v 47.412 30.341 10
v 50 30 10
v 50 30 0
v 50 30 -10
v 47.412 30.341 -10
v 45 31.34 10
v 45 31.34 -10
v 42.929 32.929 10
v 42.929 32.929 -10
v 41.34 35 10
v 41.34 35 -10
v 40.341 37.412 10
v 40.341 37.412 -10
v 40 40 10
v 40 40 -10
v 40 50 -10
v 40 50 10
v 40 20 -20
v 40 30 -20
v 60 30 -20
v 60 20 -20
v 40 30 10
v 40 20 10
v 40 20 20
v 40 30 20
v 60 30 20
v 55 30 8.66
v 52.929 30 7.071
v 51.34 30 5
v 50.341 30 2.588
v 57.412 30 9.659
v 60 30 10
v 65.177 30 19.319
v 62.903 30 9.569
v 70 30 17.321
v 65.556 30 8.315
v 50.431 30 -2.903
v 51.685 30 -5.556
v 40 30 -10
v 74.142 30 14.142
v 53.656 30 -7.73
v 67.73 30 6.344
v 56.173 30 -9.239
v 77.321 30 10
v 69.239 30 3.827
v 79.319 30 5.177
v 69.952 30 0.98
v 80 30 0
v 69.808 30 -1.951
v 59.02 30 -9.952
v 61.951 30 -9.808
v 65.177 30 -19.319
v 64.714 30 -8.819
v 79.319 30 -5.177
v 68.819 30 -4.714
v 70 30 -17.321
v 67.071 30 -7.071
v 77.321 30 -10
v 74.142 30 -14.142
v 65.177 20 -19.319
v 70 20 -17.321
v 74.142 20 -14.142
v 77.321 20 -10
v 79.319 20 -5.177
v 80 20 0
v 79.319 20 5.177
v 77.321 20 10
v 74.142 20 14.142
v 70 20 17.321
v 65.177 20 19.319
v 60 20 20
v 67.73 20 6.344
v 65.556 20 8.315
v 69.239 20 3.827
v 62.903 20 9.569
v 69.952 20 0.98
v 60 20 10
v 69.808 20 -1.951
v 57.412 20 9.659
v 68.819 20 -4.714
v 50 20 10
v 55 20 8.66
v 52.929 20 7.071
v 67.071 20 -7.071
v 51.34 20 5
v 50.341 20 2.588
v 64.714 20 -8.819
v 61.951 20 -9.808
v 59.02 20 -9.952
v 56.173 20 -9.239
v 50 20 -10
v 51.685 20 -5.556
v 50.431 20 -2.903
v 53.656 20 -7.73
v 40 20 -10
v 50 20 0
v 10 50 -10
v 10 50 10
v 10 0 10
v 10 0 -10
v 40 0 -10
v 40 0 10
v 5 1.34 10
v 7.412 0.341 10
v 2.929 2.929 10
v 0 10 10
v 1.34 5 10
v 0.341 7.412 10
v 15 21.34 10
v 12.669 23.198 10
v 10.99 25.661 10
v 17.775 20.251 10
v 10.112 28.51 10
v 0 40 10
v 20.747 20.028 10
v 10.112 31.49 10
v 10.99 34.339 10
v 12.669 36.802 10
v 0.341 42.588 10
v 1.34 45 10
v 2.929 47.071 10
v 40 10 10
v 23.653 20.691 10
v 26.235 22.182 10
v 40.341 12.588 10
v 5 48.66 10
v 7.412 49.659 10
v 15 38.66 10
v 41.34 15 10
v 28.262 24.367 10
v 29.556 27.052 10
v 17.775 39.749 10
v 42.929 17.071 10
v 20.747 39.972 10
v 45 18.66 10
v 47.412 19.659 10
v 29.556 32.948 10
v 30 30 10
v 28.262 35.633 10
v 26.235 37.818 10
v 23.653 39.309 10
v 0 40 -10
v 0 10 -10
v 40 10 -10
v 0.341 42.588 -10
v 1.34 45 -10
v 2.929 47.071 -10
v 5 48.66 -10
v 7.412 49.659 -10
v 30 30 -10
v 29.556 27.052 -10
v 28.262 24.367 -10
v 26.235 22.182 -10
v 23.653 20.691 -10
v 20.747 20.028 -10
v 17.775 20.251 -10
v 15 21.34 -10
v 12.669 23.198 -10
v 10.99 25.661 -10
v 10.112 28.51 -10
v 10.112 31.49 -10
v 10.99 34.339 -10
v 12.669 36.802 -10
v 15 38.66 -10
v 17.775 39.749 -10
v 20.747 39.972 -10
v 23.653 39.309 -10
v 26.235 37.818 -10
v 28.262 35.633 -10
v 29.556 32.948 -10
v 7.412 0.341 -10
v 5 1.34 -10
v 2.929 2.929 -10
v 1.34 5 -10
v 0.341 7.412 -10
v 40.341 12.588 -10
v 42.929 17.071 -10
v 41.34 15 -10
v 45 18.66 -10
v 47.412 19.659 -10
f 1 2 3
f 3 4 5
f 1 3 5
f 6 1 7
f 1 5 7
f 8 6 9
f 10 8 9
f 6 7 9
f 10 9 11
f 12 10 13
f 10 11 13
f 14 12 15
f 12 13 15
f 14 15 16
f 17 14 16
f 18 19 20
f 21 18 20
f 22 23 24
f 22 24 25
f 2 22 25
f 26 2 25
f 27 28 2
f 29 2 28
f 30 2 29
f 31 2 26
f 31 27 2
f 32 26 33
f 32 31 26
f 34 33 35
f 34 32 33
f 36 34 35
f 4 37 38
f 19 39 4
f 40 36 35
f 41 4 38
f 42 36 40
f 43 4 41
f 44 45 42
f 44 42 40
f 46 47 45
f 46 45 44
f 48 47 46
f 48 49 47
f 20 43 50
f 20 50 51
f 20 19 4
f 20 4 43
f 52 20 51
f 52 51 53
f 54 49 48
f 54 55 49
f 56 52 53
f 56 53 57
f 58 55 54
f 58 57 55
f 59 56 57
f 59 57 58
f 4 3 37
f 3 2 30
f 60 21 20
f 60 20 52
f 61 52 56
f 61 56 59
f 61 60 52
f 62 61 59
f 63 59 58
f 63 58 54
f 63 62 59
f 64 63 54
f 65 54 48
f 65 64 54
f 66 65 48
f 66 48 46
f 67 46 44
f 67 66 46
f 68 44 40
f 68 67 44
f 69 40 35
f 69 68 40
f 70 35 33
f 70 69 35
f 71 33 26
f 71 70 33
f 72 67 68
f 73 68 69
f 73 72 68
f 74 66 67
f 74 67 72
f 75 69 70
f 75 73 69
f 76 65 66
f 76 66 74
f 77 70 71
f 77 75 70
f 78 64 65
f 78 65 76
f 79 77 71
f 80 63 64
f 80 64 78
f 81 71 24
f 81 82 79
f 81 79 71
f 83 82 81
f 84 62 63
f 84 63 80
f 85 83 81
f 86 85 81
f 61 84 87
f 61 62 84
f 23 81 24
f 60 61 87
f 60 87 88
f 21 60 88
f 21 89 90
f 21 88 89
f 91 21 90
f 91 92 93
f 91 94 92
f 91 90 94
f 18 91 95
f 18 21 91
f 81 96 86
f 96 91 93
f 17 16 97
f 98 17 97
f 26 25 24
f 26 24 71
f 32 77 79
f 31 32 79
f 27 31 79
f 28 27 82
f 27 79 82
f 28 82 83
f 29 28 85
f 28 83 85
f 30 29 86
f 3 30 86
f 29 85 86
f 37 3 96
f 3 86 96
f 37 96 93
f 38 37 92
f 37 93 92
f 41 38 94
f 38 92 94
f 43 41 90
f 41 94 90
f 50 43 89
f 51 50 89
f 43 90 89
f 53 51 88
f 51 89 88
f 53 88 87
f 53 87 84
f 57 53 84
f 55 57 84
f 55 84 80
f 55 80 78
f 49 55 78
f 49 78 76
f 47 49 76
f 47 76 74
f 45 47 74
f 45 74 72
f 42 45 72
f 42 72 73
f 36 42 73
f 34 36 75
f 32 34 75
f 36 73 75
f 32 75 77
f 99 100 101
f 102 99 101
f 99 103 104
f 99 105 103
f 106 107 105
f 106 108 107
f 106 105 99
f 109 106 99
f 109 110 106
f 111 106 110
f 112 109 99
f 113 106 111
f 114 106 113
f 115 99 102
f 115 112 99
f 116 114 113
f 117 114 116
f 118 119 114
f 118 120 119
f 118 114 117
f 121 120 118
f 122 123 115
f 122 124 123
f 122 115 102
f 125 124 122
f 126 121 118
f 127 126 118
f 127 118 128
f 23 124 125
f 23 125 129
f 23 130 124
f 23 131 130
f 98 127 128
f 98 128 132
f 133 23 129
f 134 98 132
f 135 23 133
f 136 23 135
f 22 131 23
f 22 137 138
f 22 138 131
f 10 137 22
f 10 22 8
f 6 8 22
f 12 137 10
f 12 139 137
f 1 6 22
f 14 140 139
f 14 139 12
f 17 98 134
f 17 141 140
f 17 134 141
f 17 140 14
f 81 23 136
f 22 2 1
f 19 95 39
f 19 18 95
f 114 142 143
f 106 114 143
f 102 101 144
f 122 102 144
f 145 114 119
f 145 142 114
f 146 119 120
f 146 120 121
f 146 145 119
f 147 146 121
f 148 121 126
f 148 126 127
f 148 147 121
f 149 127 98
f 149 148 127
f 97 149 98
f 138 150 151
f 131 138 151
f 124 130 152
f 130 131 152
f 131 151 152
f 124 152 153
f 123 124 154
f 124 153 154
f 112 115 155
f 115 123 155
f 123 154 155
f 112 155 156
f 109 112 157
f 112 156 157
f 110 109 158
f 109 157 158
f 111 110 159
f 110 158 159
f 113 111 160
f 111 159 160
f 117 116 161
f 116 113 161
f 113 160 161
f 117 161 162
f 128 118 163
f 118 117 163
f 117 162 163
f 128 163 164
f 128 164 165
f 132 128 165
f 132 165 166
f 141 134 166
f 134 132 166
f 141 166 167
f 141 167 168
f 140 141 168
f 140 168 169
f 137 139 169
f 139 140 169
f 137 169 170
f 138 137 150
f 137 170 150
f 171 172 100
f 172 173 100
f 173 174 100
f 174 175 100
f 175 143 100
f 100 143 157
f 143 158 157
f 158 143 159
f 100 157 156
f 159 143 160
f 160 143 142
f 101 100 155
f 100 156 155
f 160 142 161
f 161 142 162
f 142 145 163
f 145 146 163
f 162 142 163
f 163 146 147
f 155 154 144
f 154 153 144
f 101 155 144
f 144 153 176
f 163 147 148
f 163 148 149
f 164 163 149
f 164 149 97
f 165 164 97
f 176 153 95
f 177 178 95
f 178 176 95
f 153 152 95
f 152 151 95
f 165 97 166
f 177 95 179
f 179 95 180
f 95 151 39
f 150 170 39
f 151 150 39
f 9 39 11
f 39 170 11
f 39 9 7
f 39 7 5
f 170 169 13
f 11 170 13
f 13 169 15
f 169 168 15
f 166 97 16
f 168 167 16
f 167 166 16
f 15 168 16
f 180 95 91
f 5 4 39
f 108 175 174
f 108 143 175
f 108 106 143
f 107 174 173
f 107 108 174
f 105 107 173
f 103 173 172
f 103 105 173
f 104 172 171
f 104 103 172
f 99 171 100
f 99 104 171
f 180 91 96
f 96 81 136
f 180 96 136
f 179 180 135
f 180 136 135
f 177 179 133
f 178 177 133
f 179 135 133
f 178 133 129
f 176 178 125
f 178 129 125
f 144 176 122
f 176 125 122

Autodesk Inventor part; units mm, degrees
ref_plane "YZ Plane" through (0, 0, 0) normal (1, 0, 0) x (0, 1, 0)
ref_plane "XZ Plane" through (0, 0, 0) normal (0, 1, 0) x (-1, 0, 0)
ref_plane "XY Plane" through (0, 0, 0) normal (0, 0, 1) x (1, 0, 0)
sketch "草圖1" plane through (0, 0, 0) normal (0, 0, 1) x (1, 0, 0)
  line L0 (0, 0) -> (40, 0)
  line L1 (40, 0) -> (40, 50)
  line L2 (40, 50) -> (0, 50)
  line L3 (0, 50) -> (0, 0)
  circle A0 centre (20, 30) radius 10
  dimension "d0" = 20
  dimension "d1" = 40
  dimension "d2" = 50
  dimension "d3" = 20
  dimension "d4" = 30
extrude "擠出1" add sketch "草圖1" along normal mid plane 20
sketch "草圖2" plane through (0, 0, 0) normal (0, 0, 1) x (1, 0, 0)
  line L0 (40, 0) -> (40, 50) projected
  line L1 (40, 30) -> (80, 30)
  line L2 (80, 30) -> (80, 20)
  line L3 (80, 20) -> (40, 20)
  line L4 (40, 20) -> (40, 30)
  line L5 (0, 0) -> (40, 0) projected
  dimension "d7" = 20
  dimension "d8" = 10
  dimension "d9" = 40
extrude "擠出2" add sketch "草圖2" along normal mid plane 40
fillet "圓角1" radius 20 2 edges at (80, 25, -20) (80, 25, 20)
fillet "圓角2" radius 10 2 edges at (40, 30, 0) (40, 20, 0)
fillet "圓角3" radius 10 2 edges at (0, 50, 0) (0, 0, 0)
sketch "草圖3" plane through (40, 30, 20) normal (0, 1, 0) x (1, 0, 0)
  arc A0 (20, 0) -> (20, 40) centre (20, 20) ccw projected
  point P0 (-40, 20)
hole "孔1" at (60, 30, 0) direction (0, -1, 0) diameter 20 end through all
